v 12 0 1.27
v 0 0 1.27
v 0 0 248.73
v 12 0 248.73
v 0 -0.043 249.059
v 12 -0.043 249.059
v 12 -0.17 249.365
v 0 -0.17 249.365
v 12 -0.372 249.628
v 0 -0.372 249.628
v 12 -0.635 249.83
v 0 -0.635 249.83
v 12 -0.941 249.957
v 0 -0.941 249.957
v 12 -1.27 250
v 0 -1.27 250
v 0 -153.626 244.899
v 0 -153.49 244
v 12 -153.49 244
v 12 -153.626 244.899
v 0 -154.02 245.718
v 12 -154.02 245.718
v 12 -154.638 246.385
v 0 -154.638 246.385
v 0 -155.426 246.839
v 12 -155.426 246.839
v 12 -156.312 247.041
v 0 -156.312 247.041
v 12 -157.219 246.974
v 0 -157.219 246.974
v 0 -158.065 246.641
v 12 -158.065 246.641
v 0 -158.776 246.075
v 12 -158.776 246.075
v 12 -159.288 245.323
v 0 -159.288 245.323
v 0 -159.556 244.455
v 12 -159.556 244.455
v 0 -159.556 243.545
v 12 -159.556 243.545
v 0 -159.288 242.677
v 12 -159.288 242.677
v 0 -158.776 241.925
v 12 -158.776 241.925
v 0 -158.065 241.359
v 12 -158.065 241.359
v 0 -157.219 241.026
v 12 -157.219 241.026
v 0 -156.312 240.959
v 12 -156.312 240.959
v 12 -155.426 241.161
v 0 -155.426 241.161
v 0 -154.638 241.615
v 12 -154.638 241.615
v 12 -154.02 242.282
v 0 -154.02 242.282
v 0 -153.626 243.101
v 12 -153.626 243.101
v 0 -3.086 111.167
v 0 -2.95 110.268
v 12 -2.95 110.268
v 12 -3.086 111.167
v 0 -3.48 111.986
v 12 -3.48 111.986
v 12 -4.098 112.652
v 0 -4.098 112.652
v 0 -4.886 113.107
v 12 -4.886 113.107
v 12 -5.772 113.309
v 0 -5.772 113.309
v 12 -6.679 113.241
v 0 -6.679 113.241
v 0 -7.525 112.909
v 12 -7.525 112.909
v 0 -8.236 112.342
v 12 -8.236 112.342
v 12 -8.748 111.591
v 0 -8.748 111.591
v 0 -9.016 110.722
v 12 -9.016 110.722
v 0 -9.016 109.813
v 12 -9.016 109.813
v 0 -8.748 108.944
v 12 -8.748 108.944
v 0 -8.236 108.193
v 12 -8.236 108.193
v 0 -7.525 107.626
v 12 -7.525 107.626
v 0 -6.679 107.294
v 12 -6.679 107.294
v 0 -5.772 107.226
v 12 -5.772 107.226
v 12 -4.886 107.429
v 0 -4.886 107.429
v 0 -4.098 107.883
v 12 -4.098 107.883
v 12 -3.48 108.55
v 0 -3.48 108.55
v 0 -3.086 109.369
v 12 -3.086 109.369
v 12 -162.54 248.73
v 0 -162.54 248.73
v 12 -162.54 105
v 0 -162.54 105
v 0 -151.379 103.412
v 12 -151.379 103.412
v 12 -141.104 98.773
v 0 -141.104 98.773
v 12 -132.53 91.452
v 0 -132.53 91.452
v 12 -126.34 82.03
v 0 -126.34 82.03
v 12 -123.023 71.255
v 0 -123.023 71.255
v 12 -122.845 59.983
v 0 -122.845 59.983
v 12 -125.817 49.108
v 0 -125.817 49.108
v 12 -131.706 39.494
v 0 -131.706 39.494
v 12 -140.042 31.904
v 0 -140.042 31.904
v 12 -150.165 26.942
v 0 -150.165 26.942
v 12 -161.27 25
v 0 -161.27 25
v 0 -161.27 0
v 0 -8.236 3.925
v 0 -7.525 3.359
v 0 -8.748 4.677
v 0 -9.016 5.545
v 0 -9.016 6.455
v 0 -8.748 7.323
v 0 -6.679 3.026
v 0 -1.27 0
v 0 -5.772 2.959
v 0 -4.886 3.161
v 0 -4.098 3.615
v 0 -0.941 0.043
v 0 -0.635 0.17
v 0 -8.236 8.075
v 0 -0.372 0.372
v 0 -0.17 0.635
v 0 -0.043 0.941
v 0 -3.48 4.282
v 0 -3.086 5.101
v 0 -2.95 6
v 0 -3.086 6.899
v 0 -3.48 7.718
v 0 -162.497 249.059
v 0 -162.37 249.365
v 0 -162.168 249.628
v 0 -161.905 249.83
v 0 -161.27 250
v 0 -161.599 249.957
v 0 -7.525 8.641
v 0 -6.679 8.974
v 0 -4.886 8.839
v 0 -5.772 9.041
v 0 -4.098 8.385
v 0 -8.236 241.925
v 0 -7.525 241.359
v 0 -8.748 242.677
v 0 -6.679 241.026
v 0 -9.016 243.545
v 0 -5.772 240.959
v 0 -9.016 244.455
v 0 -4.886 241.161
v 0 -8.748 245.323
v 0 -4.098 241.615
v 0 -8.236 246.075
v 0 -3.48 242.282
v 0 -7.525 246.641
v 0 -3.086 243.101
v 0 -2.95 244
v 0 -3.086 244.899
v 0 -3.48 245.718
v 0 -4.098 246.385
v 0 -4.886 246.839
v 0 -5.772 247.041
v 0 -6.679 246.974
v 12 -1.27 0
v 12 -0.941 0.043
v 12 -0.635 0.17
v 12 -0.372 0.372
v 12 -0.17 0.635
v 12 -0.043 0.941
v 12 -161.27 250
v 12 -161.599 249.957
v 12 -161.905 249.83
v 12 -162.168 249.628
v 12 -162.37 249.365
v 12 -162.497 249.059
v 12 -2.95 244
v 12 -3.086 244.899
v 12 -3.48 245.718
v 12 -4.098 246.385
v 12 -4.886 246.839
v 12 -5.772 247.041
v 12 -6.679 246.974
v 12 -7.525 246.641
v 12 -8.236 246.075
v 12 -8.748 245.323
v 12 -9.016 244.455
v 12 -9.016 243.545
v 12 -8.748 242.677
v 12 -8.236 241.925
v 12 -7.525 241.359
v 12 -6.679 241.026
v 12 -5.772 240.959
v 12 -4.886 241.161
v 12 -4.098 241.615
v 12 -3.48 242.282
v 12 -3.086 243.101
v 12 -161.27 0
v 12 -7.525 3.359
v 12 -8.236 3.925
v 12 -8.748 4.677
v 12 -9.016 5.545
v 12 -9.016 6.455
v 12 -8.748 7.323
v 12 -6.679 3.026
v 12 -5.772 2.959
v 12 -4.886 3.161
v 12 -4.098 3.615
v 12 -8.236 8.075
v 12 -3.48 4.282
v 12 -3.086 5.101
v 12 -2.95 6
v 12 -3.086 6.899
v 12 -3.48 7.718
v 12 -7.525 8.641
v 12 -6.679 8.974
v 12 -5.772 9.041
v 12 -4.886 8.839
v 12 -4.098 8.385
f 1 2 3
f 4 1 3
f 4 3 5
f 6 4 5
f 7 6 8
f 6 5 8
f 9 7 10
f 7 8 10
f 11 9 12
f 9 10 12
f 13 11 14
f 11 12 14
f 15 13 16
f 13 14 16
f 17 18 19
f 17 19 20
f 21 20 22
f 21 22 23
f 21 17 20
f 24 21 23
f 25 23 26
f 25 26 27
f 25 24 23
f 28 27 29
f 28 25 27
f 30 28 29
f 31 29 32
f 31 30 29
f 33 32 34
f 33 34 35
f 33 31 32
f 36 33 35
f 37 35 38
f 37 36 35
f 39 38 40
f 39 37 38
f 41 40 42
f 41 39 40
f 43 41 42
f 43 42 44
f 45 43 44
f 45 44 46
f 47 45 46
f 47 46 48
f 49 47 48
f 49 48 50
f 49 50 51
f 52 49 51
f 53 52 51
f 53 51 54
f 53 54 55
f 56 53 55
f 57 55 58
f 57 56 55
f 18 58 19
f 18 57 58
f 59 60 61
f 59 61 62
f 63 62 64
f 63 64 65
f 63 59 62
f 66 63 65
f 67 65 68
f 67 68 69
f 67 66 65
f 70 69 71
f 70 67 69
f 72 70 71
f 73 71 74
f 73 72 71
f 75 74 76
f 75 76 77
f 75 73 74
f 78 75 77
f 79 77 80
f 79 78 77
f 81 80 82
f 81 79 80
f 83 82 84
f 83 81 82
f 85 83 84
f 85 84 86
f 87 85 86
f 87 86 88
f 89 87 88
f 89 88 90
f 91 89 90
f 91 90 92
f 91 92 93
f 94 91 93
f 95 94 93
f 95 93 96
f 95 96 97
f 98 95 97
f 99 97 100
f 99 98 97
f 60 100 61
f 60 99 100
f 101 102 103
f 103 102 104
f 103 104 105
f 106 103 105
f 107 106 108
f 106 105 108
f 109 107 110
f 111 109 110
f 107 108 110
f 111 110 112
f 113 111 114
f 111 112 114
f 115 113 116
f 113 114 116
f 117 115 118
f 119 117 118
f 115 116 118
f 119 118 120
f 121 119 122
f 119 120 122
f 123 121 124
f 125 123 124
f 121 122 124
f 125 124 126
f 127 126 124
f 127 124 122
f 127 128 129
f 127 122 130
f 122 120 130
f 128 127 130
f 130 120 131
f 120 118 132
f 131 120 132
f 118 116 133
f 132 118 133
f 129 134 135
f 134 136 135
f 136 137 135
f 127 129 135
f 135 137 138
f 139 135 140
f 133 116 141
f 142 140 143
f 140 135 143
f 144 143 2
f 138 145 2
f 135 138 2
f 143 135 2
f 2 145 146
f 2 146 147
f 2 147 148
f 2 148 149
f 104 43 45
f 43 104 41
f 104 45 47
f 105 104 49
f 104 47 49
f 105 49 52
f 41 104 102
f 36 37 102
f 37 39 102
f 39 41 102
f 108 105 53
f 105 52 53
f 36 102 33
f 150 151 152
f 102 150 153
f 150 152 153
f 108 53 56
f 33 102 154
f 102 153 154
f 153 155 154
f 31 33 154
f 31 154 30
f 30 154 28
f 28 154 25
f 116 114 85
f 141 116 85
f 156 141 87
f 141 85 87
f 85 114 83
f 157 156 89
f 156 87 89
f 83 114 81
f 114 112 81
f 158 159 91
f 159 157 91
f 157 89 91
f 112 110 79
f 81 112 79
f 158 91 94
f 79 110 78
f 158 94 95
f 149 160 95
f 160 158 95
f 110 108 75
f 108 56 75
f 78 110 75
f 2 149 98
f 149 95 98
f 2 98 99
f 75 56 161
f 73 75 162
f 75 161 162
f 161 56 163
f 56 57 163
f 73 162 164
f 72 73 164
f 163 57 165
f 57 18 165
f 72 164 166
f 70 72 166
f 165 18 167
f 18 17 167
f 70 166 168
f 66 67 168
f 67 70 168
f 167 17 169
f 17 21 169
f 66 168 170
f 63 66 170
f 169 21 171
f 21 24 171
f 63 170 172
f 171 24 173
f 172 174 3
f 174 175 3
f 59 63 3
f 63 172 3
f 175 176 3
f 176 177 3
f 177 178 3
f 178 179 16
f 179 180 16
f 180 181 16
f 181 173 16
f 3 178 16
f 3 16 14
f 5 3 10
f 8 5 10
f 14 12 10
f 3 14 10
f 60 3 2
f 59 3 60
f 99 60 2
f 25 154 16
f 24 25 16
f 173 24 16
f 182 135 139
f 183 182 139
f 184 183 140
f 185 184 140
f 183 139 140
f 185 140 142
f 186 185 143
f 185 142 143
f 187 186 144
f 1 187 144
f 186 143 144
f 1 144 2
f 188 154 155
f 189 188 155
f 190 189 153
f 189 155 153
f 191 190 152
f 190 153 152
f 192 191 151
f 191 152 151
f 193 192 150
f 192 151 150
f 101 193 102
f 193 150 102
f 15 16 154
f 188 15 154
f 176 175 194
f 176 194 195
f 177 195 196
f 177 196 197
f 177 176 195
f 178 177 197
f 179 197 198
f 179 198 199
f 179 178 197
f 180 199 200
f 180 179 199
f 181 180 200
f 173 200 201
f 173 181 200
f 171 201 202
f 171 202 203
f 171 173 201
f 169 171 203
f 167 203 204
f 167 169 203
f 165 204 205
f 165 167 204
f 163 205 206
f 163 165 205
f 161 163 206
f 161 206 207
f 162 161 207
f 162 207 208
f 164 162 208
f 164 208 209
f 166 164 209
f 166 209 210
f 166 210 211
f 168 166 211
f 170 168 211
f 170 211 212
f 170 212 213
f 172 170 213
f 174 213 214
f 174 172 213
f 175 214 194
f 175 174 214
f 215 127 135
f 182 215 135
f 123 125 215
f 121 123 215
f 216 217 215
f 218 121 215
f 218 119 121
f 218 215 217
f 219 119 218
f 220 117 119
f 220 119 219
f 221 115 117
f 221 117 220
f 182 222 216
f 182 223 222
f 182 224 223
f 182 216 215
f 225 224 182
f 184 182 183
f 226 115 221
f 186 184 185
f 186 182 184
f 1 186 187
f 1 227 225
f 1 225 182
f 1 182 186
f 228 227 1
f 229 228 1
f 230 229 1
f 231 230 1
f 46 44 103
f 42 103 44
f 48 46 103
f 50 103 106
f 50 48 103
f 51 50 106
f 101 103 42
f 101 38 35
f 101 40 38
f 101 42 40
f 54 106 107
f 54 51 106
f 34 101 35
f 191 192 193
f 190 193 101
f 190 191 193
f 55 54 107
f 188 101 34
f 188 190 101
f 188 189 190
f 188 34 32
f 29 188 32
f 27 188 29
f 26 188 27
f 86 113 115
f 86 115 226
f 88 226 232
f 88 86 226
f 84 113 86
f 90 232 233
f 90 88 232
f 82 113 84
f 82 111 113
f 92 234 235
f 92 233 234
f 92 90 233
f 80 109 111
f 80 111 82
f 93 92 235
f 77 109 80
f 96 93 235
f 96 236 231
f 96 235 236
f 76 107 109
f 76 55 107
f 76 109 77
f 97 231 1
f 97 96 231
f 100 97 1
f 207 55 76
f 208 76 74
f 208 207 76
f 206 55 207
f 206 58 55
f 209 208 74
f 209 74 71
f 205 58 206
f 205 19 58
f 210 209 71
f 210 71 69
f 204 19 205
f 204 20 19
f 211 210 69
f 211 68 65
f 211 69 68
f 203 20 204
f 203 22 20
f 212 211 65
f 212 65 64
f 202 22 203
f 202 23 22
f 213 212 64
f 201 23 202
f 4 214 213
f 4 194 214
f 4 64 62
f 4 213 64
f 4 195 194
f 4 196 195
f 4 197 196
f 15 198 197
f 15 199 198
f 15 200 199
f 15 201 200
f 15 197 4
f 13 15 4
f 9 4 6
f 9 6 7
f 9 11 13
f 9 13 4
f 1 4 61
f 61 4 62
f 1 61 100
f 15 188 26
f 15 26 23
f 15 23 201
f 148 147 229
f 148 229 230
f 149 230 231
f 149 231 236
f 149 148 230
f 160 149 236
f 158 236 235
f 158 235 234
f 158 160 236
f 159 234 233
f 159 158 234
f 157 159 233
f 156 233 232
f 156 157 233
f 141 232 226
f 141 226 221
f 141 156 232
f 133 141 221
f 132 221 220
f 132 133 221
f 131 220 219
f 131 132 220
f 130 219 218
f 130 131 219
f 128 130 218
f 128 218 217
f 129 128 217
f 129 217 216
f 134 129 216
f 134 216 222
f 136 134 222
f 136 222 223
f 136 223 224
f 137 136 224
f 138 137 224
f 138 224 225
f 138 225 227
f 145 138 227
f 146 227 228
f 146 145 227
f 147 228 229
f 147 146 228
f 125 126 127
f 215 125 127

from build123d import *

# Parameters (mm, degrees)
F0_R     = 3.05
F1_DEPTH = 12


with BuildPart() as f1:
    # F0 (on Right) → F1 (new body)
    with BuildSketch(Plane.YZ):
        with BuildLine():
            Line((-161.27, 0), (-1.27, 0))
            ThreePointArc((-1.27, 0), (-0.371974, 0.371974), (0, 1.27))
            Line((0, 1.27), (0, 248.73))
            ThreePointArc((0, 248.73), (-0.371974, 249.628026), (-1.27, 250))
            Line((-1.27, 250), (-161.27, 250))
            ThreePointArc((-161.27, 250), (-162.168026, 249.628026), (-162.54, 248.73))
            Line((-162.54, 248.73), (-162.54, 105))
            ThreePointArc((-162.54, 105), (-122.53496, 65.624999), (-161.27, 25))
            Line((-161.27, 25), (-161.27, 0))
        make_face()
        with Locations((-6, 6)):
            Circle(F0_R, mode=Mode.SUBTRACT)
        with Locations((-6, 110.267787)):
            Circle(F0_R, mode=Mode.SUBTRACT)
        with Locations((-156.54, 244)):
            Circle(F0_R, mode=Mode.SUBTRACT)
        with Locations((-6, 244)):
            Circle(F0_R, mode=Mode.SUBTRACT)
    extrude(amount=F1_DEPTH)


solid = f1.part
